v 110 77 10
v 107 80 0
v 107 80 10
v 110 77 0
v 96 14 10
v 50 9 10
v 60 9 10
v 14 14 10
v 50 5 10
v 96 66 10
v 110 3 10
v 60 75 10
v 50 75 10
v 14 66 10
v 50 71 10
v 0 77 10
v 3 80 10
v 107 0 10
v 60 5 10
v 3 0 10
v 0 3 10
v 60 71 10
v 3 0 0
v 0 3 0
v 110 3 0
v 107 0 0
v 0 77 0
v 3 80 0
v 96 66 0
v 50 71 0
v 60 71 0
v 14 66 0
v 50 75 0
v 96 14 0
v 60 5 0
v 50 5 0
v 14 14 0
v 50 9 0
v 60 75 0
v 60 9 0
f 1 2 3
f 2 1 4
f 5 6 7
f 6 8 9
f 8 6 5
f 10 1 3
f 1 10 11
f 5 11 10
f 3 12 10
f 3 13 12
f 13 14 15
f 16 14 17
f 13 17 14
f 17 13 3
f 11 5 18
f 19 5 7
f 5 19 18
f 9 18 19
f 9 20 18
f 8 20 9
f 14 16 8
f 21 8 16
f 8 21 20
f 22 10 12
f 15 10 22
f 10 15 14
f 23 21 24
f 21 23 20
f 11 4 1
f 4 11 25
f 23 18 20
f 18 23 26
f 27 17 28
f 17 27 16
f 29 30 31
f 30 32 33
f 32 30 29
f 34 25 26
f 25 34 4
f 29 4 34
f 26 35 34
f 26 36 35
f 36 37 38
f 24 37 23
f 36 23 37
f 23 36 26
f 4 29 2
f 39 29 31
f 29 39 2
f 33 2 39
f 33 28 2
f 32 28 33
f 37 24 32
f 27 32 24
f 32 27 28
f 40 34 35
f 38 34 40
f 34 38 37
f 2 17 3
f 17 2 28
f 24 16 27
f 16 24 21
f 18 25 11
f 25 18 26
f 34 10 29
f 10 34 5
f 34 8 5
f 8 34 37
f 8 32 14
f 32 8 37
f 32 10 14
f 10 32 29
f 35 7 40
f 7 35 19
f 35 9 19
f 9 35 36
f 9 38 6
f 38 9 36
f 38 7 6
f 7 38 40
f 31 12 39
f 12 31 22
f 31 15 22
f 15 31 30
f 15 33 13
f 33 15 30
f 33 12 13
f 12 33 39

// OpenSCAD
$fn = 32;

// ----------------------------------------------------------------------
// Frame plate: 110 x 80 frame, 14 mm rails
// ----------------------------------------------------------------------

// --- parameters (mm) ---
plate_l = 110;            // plate length, X
plate_w = 80;             // plate width, Y
plate_t = 10;             // plate thickness, Z (extrusion height)
corner_c = 3;             // corner chamfer
frame_bar = 14;           // frame rail width
slot_l = 10;              // adjustment slot length
slot_w = 4;               // adjustment slot width

win_l = plate_l - 2 * frame_bar;  // window length
win_w = plate_w - 2 * frame_bar;  // window width

profile = [[3, 0], [107, 0], [110, 3], [110, 77], [107, 80], [3, 80], [0, 77], [0, 3]];  // primary outline, 8 points, counter clockwise
void_1 = [[14, 14], [96, 14], [96, 66], [14, 66]];  // the window, 4 points
void_2 = [[50, 5], [60, 5], [60, 9], [50, 9]];  // adjustment slot, 4 points
void_3 = [[50, 71], [60, 71], [60, 75], [50, 75]];  // adjustment slot, 4 points

// --- the one profile operation ---
difference() {
  linear_extrude(height = plate_t) polygon(points = profile);
  translate([0, 0, -1])
    linear_extrude(height = plate_t + 2) polygon(points = void_1);
  translate([0, 0, -1])
    linear_extrude(height = plate_t + 2) polygon(points = void_2);
  translate([0, 0, -1])
    linear_extrude(height = plate_t + 2) polygon(points = void_3);
}
